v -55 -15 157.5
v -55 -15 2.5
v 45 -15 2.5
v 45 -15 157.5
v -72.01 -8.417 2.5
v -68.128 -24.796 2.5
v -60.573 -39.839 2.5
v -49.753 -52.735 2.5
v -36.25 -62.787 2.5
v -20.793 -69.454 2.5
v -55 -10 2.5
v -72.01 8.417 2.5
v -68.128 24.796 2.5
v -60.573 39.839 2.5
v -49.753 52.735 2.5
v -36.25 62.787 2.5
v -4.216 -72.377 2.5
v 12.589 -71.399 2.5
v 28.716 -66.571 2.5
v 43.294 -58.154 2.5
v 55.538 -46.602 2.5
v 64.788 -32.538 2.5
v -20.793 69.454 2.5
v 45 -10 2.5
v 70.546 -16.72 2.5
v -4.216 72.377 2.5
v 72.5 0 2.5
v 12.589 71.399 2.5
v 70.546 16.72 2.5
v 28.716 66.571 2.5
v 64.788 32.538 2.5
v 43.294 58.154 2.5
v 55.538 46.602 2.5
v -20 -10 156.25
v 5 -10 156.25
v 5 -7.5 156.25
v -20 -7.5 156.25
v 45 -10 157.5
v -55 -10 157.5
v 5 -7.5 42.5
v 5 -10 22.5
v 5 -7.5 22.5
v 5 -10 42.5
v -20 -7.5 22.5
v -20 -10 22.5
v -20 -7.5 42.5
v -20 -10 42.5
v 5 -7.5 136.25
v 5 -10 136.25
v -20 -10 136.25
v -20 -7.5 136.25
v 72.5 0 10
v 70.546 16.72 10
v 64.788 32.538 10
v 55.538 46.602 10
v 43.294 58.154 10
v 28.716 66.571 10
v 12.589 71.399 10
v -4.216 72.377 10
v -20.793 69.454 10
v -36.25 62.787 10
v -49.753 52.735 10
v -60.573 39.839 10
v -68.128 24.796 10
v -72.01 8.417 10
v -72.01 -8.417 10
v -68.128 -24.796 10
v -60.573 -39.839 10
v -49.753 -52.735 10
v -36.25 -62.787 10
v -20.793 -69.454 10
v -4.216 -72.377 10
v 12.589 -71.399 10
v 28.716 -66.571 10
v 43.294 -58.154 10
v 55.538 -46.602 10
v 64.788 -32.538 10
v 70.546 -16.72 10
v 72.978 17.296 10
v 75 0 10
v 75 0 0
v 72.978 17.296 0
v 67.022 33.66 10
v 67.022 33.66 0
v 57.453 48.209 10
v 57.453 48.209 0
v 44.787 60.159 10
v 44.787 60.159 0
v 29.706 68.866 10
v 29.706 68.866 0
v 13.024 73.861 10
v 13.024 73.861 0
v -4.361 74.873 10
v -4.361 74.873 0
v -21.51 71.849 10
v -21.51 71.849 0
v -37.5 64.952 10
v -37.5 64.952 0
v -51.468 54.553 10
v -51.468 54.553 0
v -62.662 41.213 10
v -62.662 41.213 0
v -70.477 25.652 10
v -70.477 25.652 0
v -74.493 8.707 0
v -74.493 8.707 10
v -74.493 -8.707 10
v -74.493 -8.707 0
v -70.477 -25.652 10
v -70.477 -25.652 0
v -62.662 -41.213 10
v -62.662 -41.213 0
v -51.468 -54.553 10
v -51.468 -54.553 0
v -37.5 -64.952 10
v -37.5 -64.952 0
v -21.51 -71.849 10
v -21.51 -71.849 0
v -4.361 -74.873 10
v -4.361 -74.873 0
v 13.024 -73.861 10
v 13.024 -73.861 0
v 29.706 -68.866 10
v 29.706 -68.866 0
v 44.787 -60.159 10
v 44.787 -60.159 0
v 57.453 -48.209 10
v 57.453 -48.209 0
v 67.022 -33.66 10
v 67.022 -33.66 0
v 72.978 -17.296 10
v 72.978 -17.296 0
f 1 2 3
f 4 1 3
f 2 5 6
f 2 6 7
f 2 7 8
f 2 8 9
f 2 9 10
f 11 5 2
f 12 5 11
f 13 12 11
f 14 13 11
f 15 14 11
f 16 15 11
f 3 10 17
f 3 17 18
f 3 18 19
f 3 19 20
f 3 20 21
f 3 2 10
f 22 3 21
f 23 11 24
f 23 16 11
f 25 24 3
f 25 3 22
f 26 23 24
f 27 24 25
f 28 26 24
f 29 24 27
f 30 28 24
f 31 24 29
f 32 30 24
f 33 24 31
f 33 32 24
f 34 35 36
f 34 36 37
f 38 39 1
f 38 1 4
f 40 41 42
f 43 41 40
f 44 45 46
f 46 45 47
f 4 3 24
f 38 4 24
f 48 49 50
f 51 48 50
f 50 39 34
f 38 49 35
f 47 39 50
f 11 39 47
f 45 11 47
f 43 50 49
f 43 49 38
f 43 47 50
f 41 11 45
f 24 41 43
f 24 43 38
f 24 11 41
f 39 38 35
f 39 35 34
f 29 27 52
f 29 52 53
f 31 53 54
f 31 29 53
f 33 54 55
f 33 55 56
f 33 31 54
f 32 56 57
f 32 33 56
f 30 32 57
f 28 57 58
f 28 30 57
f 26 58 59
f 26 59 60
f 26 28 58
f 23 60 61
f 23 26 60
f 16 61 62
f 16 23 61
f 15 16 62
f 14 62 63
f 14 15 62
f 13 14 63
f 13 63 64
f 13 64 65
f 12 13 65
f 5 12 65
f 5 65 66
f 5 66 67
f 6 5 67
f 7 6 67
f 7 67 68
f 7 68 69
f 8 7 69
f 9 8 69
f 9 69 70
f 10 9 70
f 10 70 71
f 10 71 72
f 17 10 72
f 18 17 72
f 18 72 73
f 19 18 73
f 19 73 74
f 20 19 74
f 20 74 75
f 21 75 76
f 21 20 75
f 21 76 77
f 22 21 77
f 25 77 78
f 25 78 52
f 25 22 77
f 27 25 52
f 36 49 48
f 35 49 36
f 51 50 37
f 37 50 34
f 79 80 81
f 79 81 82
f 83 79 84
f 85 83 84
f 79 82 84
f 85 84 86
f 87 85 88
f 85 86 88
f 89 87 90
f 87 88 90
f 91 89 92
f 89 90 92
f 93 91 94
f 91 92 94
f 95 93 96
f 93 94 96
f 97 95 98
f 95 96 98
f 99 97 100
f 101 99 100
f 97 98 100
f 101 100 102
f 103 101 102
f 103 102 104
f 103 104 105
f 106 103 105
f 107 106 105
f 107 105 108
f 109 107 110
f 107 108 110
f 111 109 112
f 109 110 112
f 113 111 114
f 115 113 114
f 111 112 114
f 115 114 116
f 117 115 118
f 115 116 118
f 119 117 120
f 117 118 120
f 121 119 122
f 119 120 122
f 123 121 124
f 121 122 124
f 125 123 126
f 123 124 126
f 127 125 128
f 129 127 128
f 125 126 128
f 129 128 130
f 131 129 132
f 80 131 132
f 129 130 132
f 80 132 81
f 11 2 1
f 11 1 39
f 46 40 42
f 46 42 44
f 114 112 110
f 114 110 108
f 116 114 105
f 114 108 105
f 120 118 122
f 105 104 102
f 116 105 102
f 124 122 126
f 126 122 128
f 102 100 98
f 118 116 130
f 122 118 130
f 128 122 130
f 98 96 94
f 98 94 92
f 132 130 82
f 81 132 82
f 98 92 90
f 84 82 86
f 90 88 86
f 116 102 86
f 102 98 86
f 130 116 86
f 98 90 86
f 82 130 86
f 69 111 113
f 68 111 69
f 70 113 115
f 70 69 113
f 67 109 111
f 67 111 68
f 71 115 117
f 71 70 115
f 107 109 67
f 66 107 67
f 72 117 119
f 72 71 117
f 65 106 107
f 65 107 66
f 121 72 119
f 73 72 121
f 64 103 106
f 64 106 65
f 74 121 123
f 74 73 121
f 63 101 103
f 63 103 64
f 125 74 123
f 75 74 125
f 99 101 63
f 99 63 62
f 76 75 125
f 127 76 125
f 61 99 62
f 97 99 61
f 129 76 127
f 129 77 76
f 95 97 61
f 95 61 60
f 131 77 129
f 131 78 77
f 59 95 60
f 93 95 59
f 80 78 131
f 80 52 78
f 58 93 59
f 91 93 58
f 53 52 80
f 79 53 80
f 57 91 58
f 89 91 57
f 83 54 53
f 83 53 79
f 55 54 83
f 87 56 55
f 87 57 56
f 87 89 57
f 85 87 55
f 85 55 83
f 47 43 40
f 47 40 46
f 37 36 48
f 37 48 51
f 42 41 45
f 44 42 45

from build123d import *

# Parameters (mm, degrees)
F0_R     = 75
F0_R_2   = 72.5
F1_DEPTH = 10
F2_DEPTH = 2.5
F3_W     = 100
F3_H     = 5
F4_DEPTH = 155
F5_W     = 25
F5_H     = 20
F6_DEPTH = 2.5
F7_W     = 25
F7_H     = 20
F8_DEPTH = 2.5


with BuildPart() as f1:
    # F0 (on Top) → F1 (new body)
    with BuildSketch(Plane.XY):
        Circle(F0_R)
        Circle(F0_R_2, mode=Mode.SUBTRACT)
    extrude(amount=F1_DEPTH)

    # F0 (on Top) → F2 (join)
    with BuildSketch(Plane.XY):
        Circle(F0_R_2)
    extrude(amount=F2_DEPTH)

    # F3 (on face) → F4 (join)
    with BuildSketch(Plane.XY.offset(2.5)):
        with Locations((-5, -12.5)):
            Rectangle(F3_W, F3_H)
    extrude(amount=F4_DEPTH)

    # F5 (on face) → F6 (join)
    with BuildSketch(Plane(origin=(0, -10, 0), x_dir=(-1, 0, 0), z_dir=(0, 1, 0))):
        with Locations((7.5, 32.5)):
            Rectangle(F5_W, F5_H)
    extrude(amount=F6_DEPTH)

    # F7 (on face) → F8 (join)
    with BuildSketch(Plane(origin=(0, -10, 0), x_dir=(-1, 0, 0), z_dir=(0, 1, 0))):
        with Locations((7.5, 146.25)):
            Rectangle(F7_W, F7_H)
    extrude(amount=F8_DEPTH)


solid = f1.part
